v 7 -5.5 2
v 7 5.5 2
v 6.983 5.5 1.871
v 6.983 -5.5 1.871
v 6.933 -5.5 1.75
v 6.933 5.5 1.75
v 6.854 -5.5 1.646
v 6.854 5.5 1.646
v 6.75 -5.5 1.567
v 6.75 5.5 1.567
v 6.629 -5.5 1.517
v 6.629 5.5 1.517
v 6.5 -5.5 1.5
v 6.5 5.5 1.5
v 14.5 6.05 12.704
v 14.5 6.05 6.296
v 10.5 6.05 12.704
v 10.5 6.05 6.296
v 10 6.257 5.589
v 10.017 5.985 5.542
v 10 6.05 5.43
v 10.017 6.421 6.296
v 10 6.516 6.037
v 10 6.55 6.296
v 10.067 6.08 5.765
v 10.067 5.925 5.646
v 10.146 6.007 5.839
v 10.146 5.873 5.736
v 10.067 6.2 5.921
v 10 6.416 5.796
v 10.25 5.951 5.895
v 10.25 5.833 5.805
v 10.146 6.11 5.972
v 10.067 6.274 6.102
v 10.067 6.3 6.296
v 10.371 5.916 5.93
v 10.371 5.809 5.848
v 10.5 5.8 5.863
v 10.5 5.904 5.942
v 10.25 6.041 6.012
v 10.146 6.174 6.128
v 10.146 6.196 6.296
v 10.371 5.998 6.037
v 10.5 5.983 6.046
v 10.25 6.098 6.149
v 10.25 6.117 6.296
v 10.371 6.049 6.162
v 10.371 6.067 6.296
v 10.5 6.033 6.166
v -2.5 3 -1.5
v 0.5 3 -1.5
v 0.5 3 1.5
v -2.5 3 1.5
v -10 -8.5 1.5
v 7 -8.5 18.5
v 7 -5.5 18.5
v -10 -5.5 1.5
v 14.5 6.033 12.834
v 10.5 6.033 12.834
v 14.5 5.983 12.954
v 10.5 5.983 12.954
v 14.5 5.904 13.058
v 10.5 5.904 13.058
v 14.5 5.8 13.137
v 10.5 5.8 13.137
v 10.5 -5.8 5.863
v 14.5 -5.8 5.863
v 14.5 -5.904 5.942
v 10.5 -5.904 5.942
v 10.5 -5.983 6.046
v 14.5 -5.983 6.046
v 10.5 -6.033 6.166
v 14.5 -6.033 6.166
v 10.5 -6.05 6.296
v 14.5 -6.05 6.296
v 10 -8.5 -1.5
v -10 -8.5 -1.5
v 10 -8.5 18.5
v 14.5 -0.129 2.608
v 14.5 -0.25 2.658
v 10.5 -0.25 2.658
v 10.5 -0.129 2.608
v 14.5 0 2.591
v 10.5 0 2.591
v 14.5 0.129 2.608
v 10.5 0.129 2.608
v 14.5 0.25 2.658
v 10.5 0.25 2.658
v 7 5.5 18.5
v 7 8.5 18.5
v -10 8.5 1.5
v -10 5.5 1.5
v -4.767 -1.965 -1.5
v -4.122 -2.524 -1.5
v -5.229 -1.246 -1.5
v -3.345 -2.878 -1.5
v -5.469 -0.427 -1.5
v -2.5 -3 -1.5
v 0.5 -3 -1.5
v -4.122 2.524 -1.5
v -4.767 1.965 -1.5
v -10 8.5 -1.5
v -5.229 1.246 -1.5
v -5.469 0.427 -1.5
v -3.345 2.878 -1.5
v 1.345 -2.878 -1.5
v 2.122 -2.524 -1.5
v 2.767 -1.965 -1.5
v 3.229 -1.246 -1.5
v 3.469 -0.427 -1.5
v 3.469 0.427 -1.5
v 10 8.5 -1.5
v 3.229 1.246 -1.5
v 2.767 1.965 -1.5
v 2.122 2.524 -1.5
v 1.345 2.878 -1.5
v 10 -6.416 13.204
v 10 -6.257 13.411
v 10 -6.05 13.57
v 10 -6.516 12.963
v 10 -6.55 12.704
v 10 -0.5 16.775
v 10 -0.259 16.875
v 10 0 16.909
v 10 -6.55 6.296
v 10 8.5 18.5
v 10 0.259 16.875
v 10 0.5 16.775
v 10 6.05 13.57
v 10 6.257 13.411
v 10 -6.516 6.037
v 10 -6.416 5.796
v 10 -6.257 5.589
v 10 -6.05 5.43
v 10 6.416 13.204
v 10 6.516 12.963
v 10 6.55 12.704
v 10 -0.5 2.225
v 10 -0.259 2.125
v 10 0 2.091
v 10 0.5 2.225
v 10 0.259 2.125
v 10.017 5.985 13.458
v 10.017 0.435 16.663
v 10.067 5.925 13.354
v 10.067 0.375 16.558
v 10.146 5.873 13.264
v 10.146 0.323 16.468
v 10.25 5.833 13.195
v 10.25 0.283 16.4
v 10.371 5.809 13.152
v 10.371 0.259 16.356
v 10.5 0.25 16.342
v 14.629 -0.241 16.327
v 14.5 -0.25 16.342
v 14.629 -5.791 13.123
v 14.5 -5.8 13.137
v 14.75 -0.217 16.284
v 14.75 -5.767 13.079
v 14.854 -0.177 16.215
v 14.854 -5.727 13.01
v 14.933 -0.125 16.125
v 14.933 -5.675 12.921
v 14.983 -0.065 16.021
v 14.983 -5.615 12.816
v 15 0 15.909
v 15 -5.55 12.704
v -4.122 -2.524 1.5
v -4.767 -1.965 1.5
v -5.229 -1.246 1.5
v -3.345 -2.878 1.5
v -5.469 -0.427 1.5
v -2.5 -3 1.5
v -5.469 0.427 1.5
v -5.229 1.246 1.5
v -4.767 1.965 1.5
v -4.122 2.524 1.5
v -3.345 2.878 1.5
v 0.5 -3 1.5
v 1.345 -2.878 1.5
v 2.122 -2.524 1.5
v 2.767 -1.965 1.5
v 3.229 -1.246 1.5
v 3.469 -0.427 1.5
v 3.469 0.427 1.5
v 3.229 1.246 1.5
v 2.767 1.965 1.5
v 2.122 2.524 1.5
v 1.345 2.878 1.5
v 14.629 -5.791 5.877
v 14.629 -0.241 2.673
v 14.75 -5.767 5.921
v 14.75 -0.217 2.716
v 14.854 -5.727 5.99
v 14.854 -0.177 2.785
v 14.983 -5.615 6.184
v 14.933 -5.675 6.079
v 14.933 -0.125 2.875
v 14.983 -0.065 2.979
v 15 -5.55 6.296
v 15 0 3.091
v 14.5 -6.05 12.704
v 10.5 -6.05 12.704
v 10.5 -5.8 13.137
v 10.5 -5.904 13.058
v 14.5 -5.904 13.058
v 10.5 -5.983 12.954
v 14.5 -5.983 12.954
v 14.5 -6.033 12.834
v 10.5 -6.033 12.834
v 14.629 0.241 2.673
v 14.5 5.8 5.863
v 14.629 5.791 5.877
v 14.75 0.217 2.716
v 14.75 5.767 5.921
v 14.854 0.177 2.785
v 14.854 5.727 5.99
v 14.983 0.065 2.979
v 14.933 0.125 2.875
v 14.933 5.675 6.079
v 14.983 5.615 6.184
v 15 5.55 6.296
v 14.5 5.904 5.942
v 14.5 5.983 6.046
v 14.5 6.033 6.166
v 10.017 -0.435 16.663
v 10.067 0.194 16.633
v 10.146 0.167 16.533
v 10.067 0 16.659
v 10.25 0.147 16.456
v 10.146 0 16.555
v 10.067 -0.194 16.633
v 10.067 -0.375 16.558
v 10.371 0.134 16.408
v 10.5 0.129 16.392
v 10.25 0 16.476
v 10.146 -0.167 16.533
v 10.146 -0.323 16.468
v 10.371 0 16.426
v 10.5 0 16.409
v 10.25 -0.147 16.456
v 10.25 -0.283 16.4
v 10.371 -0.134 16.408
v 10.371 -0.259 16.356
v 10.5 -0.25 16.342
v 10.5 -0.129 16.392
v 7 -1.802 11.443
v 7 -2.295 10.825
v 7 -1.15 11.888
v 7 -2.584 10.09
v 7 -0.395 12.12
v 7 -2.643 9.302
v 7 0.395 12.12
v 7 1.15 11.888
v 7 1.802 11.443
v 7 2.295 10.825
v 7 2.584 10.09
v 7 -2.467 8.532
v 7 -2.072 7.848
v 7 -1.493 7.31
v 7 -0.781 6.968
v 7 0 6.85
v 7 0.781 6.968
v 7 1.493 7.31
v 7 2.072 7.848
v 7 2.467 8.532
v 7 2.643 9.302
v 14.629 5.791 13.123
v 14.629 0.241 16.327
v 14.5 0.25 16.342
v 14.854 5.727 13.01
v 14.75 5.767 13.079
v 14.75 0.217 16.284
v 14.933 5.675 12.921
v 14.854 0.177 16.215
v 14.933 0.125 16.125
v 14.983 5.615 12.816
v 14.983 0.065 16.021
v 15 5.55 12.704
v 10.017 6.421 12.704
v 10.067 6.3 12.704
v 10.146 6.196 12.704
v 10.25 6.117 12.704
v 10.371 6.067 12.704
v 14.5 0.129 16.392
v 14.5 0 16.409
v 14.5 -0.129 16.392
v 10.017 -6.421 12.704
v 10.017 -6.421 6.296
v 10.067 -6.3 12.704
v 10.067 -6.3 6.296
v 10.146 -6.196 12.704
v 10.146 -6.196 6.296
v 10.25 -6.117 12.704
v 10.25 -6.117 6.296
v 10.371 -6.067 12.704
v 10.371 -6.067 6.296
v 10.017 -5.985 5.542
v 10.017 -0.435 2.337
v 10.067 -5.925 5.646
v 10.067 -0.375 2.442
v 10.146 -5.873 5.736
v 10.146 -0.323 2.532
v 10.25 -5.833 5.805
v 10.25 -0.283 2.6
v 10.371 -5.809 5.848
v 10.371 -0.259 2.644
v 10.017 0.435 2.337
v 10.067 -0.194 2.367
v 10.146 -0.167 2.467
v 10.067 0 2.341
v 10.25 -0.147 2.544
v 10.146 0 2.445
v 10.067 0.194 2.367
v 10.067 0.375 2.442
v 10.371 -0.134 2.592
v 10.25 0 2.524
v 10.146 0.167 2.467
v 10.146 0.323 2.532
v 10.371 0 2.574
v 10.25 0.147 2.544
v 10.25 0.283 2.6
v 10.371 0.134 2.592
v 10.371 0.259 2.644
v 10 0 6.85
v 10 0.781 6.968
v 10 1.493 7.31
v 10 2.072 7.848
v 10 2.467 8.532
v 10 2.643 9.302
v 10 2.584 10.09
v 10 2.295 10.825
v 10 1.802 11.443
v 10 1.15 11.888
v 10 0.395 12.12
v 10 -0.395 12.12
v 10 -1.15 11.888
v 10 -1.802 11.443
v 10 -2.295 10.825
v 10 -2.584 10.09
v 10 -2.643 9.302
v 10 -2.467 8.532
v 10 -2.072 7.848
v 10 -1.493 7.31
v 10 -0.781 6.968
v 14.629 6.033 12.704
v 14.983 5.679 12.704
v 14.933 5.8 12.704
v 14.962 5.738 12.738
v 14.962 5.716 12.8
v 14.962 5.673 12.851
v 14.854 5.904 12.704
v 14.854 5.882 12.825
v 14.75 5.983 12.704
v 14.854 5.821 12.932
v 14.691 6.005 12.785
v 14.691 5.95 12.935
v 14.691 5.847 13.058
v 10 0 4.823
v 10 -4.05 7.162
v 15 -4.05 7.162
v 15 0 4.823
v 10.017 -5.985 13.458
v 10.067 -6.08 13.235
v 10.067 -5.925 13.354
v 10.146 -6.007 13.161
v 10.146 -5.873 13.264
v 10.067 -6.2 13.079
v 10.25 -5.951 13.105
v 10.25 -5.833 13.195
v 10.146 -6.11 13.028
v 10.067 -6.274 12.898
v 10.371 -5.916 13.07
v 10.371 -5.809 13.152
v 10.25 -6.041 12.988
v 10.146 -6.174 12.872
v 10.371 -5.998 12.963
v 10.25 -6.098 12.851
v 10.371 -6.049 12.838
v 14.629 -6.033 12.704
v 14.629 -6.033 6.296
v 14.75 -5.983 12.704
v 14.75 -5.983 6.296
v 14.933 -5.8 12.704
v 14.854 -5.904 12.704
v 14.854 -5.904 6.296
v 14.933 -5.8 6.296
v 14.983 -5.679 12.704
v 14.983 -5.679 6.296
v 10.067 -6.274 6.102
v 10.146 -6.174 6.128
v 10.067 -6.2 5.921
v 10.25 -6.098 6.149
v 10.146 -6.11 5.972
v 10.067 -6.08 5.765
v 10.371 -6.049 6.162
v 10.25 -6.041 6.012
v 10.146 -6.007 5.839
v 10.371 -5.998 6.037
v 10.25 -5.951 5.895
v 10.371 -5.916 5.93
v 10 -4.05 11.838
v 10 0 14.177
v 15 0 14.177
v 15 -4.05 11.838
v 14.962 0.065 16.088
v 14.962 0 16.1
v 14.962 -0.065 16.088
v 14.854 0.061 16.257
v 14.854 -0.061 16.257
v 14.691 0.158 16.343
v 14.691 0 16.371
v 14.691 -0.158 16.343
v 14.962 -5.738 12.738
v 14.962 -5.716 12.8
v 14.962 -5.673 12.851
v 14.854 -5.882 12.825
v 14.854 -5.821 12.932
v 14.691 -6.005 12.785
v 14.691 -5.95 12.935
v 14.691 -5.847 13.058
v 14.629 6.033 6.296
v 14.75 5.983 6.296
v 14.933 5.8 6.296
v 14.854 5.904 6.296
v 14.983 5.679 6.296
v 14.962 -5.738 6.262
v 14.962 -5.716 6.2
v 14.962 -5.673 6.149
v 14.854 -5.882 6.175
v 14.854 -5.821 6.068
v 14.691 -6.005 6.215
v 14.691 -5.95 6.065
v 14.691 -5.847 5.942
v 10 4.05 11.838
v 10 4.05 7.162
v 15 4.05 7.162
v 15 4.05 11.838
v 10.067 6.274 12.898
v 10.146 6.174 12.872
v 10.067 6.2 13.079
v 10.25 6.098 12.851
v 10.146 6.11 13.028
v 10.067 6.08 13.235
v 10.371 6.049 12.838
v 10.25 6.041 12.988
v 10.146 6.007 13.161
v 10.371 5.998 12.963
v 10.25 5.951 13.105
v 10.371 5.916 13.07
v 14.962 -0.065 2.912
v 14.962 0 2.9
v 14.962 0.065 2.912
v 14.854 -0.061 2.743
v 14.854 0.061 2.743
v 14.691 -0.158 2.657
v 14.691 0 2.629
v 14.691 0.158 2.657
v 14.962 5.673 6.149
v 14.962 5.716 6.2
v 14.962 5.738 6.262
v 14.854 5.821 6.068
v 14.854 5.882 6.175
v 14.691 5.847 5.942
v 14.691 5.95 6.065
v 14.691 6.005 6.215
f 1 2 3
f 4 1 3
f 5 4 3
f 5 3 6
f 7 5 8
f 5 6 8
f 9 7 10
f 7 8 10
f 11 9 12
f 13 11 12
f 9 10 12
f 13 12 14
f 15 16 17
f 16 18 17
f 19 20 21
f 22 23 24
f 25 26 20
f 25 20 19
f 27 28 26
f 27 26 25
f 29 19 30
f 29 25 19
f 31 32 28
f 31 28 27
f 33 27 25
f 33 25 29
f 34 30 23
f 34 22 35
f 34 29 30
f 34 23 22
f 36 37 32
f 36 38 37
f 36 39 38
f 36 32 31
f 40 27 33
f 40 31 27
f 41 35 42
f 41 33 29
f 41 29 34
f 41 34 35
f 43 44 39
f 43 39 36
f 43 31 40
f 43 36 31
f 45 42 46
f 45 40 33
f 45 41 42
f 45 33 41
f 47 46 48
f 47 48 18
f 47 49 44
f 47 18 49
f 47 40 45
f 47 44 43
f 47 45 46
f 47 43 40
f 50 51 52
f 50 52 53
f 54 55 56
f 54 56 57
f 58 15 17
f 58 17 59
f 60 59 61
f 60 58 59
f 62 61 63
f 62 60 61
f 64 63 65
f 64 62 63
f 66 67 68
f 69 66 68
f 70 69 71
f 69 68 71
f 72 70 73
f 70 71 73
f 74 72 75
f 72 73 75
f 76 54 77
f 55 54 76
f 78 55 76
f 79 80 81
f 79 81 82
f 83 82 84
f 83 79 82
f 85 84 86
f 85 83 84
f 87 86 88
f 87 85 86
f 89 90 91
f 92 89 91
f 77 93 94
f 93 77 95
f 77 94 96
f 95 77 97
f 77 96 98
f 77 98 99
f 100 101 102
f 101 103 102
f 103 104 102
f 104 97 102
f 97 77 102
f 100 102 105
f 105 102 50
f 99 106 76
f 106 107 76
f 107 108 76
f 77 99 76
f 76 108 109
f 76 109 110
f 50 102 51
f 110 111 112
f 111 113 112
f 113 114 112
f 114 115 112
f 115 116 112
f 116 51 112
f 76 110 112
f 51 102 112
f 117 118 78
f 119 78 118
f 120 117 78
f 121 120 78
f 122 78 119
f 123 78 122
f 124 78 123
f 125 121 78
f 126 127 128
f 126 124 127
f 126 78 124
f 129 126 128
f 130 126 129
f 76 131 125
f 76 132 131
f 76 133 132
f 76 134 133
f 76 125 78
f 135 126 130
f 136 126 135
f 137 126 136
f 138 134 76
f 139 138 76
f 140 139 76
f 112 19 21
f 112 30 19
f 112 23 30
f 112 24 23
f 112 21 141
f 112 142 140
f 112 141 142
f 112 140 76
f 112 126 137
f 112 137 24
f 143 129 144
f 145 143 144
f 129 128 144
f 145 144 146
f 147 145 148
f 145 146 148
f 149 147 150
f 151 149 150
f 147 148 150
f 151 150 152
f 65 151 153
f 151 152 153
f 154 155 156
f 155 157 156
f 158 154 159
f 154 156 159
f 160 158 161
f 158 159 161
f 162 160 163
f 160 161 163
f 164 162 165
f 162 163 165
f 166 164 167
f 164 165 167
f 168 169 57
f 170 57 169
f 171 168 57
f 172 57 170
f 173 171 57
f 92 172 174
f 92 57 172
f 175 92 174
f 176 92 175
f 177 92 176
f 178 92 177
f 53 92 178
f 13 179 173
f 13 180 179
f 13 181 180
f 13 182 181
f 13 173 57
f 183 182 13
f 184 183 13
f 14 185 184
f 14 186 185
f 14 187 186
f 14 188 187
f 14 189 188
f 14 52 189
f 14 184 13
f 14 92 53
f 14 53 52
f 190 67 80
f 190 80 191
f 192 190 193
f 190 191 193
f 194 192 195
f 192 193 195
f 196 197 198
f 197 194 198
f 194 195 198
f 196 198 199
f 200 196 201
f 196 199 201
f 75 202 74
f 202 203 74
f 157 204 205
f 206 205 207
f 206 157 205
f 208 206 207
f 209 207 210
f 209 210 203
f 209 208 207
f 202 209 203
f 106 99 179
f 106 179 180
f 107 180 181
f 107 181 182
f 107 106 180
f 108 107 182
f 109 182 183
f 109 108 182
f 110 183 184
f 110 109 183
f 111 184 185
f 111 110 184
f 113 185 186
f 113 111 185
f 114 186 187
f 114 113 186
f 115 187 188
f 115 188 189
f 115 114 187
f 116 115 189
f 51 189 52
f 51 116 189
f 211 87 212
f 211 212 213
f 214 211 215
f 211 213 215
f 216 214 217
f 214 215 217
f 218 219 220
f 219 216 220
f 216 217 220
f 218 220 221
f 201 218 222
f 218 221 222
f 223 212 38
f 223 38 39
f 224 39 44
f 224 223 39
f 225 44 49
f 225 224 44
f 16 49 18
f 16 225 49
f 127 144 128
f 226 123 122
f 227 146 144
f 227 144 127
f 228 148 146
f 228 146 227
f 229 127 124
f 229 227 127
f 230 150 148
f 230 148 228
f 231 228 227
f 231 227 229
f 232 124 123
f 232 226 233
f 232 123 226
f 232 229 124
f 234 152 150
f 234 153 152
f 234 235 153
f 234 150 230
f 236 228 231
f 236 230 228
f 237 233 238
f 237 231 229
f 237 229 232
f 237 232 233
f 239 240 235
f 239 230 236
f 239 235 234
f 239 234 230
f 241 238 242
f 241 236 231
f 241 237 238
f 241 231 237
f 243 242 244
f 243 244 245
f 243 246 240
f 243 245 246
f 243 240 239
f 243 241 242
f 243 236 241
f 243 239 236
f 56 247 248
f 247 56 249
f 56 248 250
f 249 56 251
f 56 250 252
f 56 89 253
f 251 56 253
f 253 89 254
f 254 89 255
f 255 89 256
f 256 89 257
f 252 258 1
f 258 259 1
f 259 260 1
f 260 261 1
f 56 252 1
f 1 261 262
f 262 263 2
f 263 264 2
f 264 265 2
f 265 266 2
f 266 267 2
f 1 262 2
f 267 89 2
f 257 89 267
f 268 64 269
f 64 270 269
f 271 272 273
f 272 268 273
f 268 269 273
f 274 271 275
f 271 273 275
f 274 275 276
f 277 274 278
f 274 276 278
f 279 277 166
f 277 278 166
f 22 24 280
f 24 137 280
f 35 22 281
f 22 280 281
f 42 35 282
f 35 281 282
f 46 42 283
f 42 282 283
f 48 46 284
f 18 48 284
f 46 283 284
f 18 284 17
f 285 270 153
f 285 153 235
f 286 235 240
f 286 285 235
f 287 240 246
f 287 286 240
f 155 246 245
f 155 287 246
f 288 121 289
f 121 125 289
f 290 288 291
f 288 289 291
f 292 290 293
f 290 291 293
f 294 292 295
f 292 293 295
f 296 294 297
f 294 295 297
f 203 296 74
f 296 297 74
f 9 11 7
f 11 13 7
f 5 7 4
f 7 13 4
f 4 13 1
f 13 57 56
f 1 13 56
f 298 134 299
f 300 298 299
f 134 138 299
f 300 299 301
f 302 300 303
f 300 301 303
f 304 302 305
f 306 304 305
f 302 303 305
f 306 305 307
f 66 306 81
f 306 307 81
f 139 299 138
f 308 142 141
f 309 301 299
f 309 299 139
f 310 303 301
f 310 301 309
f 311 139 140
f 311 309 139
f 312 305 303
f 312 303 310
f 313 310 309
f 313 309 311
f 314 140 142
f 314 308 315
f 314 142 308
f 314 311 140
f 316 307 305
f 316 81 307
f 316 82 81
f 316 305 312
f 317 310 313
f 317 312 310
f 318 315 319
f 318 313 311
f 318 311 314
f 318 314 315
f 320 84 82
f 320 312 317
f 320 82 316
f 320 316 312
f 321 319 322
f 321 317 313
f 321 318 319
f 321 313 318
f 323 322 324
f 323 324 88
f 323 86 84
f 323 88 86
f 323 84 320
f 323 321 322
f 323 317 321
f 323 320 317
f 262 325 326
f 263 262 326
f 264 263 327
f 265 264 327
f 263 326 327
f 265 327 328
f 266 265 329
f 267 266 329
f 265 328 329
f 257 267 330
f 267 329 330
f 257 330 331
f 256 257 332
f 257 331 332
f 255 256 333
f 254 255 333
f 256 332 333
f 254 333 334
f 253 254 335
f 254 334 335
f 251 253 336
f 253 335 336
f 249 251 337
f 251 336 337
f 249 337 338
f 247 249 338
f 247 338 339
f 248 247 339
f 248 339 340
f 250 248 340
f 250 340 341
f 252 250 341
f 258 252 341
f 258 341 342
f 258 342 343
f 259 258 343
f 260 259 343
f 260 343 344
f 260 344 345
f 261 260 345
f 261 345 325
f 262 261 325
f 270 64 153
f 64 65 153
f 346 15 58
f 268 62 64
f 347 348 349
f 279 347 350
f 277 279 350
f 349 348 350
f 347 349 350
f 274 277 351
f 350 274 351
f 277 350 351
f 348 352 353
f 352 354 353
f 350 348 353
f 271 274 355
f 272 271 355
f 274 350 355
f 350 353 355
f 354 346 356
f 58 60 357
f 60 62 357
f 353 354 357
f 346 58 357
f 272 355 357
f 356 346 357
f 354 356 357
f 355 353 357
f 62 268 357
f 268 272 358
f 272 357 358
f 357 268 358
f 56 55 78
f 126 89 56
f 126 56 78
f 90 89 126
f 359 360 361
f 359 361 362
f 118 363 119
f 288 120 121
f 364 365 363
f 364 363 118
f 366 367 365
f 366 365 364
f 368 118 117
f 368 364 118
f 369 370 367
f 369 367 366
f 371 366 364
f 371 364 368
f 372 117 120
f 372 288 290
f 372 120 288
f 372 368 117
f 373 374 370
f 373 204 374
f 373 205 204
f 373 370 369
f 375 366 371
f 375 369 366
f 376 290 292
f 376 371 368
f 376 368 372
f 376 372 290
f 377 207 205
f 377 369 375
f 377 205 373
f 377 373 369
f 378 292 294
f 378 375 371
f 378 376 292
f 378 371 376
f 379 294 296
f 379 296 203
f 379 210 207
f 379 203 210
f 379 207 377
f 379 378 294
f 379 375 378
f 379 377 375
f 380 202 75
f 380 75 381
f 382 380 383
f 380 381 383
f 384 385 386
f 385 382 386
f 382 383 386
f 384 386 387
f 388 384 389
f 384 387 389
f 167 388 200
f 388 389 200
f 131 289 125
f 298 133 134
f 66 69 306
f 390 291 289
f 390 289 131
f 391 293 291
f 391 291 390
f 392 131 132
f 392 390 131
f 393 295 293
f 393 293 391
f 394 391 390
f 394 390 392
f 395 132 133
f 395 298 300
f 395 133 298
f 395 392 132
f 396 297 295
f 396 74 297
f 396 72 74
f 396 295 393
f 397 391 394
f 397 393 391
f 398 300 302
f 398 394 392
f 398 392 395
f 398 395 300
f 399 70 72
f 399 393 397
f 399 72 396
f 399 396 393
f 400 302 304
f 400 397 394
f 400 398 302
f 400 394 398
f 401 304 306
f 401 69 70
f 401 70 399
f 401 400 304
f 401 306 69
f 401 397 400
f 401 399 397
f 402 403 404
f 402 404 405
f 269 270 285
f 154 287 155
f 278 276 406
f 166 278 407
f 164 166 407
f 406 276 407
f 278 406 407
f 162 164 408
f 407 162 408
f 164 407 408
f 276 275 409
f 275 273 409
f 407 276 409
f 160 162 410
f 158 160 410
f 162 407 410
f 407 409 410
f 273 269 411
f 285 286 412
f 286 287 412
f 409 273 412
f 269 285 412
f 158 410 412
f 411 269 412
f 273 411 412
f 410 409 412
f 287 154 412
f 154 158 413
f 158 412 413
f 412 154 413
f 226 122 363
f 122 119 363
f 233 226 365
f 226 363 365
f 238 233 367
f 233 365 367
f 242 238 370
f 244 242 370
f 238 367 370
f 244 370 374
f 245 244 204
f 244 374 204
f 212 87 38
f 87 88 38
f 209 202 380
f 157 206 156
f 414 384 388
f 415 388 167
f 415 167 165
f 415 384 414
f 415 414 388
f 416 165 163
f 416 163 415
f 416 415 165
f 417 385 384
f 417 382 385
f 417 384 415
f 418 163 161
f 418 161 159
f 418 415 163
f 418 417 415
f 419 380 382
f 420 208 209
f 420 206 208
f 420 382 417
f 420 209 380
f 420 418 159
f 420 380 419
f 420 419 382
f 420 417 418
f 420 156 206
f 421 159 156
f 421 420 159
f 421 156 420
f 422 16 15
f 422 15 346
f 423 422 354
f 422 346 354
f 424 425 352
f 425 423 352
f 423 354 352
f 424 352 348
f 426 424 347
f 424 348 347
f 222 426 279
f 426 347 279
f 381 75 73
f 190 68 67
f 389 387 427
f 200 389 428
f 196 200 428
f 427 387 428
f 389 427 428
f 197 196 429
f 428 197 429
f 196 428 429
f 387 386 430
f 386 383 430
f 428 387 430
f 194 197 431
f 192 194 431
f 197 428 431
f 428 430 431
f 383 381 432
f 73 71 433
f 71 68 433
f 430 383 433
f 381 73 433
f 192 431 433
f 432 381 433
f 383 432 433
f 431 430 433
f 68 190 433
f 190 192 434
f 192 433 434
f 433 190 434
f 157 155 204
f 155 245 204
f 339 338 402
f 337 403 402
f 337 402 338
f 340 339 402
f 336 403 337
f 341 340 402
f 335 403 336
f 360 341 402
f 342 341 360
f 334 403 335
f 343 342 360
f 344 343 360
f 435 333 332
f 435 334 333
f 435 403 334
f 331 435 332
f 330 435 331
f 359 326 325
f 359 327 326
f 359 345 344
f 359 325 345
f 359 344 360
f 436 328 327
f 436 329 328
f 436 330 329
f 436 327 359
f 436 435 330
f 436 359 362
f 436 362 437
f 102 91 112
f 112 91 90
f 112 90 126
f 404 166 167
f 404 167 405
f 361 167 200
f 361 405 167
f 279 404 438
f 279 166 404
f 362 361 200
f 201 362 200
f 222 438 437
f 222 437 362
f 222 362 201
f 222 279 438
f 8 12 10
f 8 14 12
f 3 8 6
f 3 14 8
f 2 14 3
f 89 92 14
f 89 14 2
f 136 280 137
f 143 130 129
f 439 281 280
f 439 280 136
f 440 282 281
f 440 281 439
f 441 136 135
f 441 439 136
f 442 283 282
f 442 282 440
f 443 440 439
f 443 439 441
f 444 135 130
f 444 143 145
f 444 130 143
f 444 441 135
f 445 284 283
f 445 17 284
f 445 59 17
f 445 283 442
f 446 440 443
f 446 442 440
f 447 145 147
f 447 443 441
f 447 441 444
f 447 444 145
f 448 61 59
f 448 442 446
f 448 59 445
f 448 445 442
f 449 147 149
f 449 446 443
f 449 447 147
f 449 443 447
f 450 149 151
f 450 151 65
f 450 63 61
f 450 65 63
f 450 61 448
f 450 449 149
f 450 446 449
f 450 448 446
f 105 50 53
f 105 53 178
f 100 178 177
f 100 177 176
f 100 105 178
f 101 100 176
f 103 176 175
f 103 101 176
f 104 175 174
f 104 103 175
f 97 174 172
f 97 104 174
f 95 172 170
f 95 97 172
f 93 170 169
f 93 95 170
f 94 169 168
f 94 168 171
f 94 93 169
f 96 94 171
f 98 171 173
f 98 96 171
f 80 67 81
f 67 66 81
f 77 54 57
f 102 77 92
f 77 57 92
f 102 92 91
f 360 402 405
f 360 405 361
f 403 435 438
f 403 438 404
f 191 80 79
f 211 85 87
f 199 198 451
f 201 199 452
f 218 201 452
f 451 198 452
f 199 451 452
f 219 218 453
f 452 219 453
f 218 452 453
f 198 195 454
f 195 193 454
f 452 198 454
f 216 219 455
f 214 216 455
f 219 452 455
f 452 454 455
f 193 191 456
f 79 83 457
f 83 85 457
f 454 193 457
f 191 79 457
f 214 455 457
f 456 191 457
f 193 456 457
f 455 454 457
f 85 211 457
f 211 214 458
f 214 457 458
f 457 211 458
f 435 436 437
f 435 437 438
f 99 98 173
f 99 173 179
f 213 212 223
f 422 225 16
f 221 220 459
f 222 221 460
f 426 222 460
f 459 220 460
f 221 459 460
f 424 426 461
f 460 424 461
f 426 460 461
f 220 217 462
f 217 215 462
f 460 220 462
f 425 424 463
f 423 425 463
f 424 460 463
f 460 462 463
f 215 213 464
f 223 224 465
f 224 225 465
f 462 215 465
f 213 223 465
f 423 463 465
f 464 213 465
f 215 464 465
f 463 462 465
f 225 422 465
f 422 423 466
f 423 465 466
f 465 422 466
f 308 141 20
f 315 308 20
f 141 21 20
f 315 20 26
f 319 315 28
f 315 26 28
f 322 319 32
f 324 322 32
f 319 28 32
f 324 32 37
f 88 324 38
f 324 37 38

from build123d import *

# Parameters (mm, degrees)
CROQUIS2_W                      = 20
CROQUIS2_H                      = 17
SALIENTE_EXTRUIR1_DEPTH         = 1.5
CROQUIS3_W                      = 20
CROQUIS3_H                      = 17
SALIENTE_EXTRUIR2_DEPTH         = 3
RANURA_START                    = -1.5
RANURA_DE_MARGEN_PARA_M65_DEPTH = 3
REDONDEO1_R                     = 0.5
SALIENTE_EXTRUIR3_DEPTH         = 3
TALADRO_DE_MARGEN_PARA_M51_D    = 5.3
SALIENTE_EXTRUIR4_DEPTH         = 5
REDONDEO2_R                     = 0.5


# Read off the part's stored shape, not the designer's step: Ranura de margen para M65
with BuildPart() as part:
    # Croquis2 → Saliente-Extruir1 (new, symmetric)
    with BuildSketch(Plane.XY):
        Rectangle(CROQUIS2_W, CROQUIS2_H)
    extrude(amount=SALIENTE_EXTRUIR1_DEPTH, both=True)

    # Croquis3 → Saliente-Extruir2 (add)
    with BuildSketch(Plane(origin=(7, 0, 0), x_dir=(0, 0, -1), z_dir=(1, 0, 0))):
        with Locations((-8.5, 0)):
            Rectangle(CROQUIS3_W, CROQUIS3_H)
    extrude(amount=SALIENTE_EXTRUIR2_DEPTH)

    # Ranura de margen para M65 outline → Ranura de margen para M65 (cut)
    with BuildSketch(Plane.XY.offset(RANURA_START)):
        with BuildLine():
            Line((-2.5, -3), (0.5, -3))
            ThreePointArc((0.5, -3), (3.5, 0), (0.5, 3))
            Line((0.5, 3), (-2.5, 3))
            ThreePointArc((-2.5, 3), (-5.5, 0), (-2.5, -3))
        make_face()
    extrude(amount=RANURA_DE_MARGEN_PARA_M65_DEPTH, mode=Mode.SUBTRACT)

    # Redondeo1
    redondeo1_edges = [part.edges().sort_by_distance(p)[0] for p in [
        (7, 0, 1.5),
    ]]
    fillet(redondeo1_edges, radius=REDONDEO1_R)

    # Croquis9 → Saliente-Extruir3 (add)
    with BuildSketch(Plane.XZ.offset(8.5)):
        Polygon((7, 18.5), (-10, 1.5), (-10, -1.5), (10, -1.5), (10, 18.5), align=None)
    saliente_extruir3 = extrude(amount=-SALIENTE_EXTRUIR3_DEPTH)

    # Simetría2: Saliente-Extruir3 across plane
    add(saliente_extruir3.mirror(Plane.ZX))

    # Taladro de margen para M51 (through all)
    with Locations(Plane.ZY.offset(-7)):
        with Locations((9.5, 0)):
            Hole(TALADRO_DE_MARGEN_PARA_M51_D / 2)

    # Croquis12 → Saliente-Extruir4 (add)
    with BuildSketch(Plane(origin=(10, 0, 0), x_dir=(0, 0, -1), z_dir=(1, 0, 0))):
        Polygon((-6.007030871, -6.05), (-2.514061743, 0), (-6.007030871, 6.05), (-12.992969129, 6.05), (-16.485938257, 0), (-12.992969129, -6.05), align=None)
        Polygon((-7.16173141, -4.05), (-4.82346282, 0), (-7.16173141, 4.05), (-11.83826859, 4.05), (-14.17653718, 0), (-11.83826859, -4.05), align=None, mode=Mode.SUBTRACT)
    extrude(amount=SALIENTE_EXTRUIR4_DEPTH)

    # Redondeo2
    redondeo2_edges = [part.edges().sort_by_distance(p)[0] for p in [
        (15, -6.05, 9.5),
        (15, -3.025, 4.260546307),
        (15, 3.025, 4.260546307),
        (15, 6.05, 9.5),
        (15, 3.025, 14.739453693),
        (15, -3.025, 14.739453693),
        (10, -6.05, 9.5),
        (12.5, -6.05, 12.992969129),
        (10, -3.025, 4.260546307),
        (12.5, -6.05, 6.007030871),
        (10, 3.025, 4.260546307),
        (12.5, 0, 2.514061743),
        (10, 6.05, 9.5),
        (12.5, 6.05, 6.007030871),
        (10, 3.025, 14.739453693),
        (12.5, 6.05, 12.992969129),
        (10, -3.025, 14.739453693),
        (12.5, 0, 16.485938257),
    ]]
    fillet(redondeo2_edges, radius=REDONDEO2_R)


solid = part.part
